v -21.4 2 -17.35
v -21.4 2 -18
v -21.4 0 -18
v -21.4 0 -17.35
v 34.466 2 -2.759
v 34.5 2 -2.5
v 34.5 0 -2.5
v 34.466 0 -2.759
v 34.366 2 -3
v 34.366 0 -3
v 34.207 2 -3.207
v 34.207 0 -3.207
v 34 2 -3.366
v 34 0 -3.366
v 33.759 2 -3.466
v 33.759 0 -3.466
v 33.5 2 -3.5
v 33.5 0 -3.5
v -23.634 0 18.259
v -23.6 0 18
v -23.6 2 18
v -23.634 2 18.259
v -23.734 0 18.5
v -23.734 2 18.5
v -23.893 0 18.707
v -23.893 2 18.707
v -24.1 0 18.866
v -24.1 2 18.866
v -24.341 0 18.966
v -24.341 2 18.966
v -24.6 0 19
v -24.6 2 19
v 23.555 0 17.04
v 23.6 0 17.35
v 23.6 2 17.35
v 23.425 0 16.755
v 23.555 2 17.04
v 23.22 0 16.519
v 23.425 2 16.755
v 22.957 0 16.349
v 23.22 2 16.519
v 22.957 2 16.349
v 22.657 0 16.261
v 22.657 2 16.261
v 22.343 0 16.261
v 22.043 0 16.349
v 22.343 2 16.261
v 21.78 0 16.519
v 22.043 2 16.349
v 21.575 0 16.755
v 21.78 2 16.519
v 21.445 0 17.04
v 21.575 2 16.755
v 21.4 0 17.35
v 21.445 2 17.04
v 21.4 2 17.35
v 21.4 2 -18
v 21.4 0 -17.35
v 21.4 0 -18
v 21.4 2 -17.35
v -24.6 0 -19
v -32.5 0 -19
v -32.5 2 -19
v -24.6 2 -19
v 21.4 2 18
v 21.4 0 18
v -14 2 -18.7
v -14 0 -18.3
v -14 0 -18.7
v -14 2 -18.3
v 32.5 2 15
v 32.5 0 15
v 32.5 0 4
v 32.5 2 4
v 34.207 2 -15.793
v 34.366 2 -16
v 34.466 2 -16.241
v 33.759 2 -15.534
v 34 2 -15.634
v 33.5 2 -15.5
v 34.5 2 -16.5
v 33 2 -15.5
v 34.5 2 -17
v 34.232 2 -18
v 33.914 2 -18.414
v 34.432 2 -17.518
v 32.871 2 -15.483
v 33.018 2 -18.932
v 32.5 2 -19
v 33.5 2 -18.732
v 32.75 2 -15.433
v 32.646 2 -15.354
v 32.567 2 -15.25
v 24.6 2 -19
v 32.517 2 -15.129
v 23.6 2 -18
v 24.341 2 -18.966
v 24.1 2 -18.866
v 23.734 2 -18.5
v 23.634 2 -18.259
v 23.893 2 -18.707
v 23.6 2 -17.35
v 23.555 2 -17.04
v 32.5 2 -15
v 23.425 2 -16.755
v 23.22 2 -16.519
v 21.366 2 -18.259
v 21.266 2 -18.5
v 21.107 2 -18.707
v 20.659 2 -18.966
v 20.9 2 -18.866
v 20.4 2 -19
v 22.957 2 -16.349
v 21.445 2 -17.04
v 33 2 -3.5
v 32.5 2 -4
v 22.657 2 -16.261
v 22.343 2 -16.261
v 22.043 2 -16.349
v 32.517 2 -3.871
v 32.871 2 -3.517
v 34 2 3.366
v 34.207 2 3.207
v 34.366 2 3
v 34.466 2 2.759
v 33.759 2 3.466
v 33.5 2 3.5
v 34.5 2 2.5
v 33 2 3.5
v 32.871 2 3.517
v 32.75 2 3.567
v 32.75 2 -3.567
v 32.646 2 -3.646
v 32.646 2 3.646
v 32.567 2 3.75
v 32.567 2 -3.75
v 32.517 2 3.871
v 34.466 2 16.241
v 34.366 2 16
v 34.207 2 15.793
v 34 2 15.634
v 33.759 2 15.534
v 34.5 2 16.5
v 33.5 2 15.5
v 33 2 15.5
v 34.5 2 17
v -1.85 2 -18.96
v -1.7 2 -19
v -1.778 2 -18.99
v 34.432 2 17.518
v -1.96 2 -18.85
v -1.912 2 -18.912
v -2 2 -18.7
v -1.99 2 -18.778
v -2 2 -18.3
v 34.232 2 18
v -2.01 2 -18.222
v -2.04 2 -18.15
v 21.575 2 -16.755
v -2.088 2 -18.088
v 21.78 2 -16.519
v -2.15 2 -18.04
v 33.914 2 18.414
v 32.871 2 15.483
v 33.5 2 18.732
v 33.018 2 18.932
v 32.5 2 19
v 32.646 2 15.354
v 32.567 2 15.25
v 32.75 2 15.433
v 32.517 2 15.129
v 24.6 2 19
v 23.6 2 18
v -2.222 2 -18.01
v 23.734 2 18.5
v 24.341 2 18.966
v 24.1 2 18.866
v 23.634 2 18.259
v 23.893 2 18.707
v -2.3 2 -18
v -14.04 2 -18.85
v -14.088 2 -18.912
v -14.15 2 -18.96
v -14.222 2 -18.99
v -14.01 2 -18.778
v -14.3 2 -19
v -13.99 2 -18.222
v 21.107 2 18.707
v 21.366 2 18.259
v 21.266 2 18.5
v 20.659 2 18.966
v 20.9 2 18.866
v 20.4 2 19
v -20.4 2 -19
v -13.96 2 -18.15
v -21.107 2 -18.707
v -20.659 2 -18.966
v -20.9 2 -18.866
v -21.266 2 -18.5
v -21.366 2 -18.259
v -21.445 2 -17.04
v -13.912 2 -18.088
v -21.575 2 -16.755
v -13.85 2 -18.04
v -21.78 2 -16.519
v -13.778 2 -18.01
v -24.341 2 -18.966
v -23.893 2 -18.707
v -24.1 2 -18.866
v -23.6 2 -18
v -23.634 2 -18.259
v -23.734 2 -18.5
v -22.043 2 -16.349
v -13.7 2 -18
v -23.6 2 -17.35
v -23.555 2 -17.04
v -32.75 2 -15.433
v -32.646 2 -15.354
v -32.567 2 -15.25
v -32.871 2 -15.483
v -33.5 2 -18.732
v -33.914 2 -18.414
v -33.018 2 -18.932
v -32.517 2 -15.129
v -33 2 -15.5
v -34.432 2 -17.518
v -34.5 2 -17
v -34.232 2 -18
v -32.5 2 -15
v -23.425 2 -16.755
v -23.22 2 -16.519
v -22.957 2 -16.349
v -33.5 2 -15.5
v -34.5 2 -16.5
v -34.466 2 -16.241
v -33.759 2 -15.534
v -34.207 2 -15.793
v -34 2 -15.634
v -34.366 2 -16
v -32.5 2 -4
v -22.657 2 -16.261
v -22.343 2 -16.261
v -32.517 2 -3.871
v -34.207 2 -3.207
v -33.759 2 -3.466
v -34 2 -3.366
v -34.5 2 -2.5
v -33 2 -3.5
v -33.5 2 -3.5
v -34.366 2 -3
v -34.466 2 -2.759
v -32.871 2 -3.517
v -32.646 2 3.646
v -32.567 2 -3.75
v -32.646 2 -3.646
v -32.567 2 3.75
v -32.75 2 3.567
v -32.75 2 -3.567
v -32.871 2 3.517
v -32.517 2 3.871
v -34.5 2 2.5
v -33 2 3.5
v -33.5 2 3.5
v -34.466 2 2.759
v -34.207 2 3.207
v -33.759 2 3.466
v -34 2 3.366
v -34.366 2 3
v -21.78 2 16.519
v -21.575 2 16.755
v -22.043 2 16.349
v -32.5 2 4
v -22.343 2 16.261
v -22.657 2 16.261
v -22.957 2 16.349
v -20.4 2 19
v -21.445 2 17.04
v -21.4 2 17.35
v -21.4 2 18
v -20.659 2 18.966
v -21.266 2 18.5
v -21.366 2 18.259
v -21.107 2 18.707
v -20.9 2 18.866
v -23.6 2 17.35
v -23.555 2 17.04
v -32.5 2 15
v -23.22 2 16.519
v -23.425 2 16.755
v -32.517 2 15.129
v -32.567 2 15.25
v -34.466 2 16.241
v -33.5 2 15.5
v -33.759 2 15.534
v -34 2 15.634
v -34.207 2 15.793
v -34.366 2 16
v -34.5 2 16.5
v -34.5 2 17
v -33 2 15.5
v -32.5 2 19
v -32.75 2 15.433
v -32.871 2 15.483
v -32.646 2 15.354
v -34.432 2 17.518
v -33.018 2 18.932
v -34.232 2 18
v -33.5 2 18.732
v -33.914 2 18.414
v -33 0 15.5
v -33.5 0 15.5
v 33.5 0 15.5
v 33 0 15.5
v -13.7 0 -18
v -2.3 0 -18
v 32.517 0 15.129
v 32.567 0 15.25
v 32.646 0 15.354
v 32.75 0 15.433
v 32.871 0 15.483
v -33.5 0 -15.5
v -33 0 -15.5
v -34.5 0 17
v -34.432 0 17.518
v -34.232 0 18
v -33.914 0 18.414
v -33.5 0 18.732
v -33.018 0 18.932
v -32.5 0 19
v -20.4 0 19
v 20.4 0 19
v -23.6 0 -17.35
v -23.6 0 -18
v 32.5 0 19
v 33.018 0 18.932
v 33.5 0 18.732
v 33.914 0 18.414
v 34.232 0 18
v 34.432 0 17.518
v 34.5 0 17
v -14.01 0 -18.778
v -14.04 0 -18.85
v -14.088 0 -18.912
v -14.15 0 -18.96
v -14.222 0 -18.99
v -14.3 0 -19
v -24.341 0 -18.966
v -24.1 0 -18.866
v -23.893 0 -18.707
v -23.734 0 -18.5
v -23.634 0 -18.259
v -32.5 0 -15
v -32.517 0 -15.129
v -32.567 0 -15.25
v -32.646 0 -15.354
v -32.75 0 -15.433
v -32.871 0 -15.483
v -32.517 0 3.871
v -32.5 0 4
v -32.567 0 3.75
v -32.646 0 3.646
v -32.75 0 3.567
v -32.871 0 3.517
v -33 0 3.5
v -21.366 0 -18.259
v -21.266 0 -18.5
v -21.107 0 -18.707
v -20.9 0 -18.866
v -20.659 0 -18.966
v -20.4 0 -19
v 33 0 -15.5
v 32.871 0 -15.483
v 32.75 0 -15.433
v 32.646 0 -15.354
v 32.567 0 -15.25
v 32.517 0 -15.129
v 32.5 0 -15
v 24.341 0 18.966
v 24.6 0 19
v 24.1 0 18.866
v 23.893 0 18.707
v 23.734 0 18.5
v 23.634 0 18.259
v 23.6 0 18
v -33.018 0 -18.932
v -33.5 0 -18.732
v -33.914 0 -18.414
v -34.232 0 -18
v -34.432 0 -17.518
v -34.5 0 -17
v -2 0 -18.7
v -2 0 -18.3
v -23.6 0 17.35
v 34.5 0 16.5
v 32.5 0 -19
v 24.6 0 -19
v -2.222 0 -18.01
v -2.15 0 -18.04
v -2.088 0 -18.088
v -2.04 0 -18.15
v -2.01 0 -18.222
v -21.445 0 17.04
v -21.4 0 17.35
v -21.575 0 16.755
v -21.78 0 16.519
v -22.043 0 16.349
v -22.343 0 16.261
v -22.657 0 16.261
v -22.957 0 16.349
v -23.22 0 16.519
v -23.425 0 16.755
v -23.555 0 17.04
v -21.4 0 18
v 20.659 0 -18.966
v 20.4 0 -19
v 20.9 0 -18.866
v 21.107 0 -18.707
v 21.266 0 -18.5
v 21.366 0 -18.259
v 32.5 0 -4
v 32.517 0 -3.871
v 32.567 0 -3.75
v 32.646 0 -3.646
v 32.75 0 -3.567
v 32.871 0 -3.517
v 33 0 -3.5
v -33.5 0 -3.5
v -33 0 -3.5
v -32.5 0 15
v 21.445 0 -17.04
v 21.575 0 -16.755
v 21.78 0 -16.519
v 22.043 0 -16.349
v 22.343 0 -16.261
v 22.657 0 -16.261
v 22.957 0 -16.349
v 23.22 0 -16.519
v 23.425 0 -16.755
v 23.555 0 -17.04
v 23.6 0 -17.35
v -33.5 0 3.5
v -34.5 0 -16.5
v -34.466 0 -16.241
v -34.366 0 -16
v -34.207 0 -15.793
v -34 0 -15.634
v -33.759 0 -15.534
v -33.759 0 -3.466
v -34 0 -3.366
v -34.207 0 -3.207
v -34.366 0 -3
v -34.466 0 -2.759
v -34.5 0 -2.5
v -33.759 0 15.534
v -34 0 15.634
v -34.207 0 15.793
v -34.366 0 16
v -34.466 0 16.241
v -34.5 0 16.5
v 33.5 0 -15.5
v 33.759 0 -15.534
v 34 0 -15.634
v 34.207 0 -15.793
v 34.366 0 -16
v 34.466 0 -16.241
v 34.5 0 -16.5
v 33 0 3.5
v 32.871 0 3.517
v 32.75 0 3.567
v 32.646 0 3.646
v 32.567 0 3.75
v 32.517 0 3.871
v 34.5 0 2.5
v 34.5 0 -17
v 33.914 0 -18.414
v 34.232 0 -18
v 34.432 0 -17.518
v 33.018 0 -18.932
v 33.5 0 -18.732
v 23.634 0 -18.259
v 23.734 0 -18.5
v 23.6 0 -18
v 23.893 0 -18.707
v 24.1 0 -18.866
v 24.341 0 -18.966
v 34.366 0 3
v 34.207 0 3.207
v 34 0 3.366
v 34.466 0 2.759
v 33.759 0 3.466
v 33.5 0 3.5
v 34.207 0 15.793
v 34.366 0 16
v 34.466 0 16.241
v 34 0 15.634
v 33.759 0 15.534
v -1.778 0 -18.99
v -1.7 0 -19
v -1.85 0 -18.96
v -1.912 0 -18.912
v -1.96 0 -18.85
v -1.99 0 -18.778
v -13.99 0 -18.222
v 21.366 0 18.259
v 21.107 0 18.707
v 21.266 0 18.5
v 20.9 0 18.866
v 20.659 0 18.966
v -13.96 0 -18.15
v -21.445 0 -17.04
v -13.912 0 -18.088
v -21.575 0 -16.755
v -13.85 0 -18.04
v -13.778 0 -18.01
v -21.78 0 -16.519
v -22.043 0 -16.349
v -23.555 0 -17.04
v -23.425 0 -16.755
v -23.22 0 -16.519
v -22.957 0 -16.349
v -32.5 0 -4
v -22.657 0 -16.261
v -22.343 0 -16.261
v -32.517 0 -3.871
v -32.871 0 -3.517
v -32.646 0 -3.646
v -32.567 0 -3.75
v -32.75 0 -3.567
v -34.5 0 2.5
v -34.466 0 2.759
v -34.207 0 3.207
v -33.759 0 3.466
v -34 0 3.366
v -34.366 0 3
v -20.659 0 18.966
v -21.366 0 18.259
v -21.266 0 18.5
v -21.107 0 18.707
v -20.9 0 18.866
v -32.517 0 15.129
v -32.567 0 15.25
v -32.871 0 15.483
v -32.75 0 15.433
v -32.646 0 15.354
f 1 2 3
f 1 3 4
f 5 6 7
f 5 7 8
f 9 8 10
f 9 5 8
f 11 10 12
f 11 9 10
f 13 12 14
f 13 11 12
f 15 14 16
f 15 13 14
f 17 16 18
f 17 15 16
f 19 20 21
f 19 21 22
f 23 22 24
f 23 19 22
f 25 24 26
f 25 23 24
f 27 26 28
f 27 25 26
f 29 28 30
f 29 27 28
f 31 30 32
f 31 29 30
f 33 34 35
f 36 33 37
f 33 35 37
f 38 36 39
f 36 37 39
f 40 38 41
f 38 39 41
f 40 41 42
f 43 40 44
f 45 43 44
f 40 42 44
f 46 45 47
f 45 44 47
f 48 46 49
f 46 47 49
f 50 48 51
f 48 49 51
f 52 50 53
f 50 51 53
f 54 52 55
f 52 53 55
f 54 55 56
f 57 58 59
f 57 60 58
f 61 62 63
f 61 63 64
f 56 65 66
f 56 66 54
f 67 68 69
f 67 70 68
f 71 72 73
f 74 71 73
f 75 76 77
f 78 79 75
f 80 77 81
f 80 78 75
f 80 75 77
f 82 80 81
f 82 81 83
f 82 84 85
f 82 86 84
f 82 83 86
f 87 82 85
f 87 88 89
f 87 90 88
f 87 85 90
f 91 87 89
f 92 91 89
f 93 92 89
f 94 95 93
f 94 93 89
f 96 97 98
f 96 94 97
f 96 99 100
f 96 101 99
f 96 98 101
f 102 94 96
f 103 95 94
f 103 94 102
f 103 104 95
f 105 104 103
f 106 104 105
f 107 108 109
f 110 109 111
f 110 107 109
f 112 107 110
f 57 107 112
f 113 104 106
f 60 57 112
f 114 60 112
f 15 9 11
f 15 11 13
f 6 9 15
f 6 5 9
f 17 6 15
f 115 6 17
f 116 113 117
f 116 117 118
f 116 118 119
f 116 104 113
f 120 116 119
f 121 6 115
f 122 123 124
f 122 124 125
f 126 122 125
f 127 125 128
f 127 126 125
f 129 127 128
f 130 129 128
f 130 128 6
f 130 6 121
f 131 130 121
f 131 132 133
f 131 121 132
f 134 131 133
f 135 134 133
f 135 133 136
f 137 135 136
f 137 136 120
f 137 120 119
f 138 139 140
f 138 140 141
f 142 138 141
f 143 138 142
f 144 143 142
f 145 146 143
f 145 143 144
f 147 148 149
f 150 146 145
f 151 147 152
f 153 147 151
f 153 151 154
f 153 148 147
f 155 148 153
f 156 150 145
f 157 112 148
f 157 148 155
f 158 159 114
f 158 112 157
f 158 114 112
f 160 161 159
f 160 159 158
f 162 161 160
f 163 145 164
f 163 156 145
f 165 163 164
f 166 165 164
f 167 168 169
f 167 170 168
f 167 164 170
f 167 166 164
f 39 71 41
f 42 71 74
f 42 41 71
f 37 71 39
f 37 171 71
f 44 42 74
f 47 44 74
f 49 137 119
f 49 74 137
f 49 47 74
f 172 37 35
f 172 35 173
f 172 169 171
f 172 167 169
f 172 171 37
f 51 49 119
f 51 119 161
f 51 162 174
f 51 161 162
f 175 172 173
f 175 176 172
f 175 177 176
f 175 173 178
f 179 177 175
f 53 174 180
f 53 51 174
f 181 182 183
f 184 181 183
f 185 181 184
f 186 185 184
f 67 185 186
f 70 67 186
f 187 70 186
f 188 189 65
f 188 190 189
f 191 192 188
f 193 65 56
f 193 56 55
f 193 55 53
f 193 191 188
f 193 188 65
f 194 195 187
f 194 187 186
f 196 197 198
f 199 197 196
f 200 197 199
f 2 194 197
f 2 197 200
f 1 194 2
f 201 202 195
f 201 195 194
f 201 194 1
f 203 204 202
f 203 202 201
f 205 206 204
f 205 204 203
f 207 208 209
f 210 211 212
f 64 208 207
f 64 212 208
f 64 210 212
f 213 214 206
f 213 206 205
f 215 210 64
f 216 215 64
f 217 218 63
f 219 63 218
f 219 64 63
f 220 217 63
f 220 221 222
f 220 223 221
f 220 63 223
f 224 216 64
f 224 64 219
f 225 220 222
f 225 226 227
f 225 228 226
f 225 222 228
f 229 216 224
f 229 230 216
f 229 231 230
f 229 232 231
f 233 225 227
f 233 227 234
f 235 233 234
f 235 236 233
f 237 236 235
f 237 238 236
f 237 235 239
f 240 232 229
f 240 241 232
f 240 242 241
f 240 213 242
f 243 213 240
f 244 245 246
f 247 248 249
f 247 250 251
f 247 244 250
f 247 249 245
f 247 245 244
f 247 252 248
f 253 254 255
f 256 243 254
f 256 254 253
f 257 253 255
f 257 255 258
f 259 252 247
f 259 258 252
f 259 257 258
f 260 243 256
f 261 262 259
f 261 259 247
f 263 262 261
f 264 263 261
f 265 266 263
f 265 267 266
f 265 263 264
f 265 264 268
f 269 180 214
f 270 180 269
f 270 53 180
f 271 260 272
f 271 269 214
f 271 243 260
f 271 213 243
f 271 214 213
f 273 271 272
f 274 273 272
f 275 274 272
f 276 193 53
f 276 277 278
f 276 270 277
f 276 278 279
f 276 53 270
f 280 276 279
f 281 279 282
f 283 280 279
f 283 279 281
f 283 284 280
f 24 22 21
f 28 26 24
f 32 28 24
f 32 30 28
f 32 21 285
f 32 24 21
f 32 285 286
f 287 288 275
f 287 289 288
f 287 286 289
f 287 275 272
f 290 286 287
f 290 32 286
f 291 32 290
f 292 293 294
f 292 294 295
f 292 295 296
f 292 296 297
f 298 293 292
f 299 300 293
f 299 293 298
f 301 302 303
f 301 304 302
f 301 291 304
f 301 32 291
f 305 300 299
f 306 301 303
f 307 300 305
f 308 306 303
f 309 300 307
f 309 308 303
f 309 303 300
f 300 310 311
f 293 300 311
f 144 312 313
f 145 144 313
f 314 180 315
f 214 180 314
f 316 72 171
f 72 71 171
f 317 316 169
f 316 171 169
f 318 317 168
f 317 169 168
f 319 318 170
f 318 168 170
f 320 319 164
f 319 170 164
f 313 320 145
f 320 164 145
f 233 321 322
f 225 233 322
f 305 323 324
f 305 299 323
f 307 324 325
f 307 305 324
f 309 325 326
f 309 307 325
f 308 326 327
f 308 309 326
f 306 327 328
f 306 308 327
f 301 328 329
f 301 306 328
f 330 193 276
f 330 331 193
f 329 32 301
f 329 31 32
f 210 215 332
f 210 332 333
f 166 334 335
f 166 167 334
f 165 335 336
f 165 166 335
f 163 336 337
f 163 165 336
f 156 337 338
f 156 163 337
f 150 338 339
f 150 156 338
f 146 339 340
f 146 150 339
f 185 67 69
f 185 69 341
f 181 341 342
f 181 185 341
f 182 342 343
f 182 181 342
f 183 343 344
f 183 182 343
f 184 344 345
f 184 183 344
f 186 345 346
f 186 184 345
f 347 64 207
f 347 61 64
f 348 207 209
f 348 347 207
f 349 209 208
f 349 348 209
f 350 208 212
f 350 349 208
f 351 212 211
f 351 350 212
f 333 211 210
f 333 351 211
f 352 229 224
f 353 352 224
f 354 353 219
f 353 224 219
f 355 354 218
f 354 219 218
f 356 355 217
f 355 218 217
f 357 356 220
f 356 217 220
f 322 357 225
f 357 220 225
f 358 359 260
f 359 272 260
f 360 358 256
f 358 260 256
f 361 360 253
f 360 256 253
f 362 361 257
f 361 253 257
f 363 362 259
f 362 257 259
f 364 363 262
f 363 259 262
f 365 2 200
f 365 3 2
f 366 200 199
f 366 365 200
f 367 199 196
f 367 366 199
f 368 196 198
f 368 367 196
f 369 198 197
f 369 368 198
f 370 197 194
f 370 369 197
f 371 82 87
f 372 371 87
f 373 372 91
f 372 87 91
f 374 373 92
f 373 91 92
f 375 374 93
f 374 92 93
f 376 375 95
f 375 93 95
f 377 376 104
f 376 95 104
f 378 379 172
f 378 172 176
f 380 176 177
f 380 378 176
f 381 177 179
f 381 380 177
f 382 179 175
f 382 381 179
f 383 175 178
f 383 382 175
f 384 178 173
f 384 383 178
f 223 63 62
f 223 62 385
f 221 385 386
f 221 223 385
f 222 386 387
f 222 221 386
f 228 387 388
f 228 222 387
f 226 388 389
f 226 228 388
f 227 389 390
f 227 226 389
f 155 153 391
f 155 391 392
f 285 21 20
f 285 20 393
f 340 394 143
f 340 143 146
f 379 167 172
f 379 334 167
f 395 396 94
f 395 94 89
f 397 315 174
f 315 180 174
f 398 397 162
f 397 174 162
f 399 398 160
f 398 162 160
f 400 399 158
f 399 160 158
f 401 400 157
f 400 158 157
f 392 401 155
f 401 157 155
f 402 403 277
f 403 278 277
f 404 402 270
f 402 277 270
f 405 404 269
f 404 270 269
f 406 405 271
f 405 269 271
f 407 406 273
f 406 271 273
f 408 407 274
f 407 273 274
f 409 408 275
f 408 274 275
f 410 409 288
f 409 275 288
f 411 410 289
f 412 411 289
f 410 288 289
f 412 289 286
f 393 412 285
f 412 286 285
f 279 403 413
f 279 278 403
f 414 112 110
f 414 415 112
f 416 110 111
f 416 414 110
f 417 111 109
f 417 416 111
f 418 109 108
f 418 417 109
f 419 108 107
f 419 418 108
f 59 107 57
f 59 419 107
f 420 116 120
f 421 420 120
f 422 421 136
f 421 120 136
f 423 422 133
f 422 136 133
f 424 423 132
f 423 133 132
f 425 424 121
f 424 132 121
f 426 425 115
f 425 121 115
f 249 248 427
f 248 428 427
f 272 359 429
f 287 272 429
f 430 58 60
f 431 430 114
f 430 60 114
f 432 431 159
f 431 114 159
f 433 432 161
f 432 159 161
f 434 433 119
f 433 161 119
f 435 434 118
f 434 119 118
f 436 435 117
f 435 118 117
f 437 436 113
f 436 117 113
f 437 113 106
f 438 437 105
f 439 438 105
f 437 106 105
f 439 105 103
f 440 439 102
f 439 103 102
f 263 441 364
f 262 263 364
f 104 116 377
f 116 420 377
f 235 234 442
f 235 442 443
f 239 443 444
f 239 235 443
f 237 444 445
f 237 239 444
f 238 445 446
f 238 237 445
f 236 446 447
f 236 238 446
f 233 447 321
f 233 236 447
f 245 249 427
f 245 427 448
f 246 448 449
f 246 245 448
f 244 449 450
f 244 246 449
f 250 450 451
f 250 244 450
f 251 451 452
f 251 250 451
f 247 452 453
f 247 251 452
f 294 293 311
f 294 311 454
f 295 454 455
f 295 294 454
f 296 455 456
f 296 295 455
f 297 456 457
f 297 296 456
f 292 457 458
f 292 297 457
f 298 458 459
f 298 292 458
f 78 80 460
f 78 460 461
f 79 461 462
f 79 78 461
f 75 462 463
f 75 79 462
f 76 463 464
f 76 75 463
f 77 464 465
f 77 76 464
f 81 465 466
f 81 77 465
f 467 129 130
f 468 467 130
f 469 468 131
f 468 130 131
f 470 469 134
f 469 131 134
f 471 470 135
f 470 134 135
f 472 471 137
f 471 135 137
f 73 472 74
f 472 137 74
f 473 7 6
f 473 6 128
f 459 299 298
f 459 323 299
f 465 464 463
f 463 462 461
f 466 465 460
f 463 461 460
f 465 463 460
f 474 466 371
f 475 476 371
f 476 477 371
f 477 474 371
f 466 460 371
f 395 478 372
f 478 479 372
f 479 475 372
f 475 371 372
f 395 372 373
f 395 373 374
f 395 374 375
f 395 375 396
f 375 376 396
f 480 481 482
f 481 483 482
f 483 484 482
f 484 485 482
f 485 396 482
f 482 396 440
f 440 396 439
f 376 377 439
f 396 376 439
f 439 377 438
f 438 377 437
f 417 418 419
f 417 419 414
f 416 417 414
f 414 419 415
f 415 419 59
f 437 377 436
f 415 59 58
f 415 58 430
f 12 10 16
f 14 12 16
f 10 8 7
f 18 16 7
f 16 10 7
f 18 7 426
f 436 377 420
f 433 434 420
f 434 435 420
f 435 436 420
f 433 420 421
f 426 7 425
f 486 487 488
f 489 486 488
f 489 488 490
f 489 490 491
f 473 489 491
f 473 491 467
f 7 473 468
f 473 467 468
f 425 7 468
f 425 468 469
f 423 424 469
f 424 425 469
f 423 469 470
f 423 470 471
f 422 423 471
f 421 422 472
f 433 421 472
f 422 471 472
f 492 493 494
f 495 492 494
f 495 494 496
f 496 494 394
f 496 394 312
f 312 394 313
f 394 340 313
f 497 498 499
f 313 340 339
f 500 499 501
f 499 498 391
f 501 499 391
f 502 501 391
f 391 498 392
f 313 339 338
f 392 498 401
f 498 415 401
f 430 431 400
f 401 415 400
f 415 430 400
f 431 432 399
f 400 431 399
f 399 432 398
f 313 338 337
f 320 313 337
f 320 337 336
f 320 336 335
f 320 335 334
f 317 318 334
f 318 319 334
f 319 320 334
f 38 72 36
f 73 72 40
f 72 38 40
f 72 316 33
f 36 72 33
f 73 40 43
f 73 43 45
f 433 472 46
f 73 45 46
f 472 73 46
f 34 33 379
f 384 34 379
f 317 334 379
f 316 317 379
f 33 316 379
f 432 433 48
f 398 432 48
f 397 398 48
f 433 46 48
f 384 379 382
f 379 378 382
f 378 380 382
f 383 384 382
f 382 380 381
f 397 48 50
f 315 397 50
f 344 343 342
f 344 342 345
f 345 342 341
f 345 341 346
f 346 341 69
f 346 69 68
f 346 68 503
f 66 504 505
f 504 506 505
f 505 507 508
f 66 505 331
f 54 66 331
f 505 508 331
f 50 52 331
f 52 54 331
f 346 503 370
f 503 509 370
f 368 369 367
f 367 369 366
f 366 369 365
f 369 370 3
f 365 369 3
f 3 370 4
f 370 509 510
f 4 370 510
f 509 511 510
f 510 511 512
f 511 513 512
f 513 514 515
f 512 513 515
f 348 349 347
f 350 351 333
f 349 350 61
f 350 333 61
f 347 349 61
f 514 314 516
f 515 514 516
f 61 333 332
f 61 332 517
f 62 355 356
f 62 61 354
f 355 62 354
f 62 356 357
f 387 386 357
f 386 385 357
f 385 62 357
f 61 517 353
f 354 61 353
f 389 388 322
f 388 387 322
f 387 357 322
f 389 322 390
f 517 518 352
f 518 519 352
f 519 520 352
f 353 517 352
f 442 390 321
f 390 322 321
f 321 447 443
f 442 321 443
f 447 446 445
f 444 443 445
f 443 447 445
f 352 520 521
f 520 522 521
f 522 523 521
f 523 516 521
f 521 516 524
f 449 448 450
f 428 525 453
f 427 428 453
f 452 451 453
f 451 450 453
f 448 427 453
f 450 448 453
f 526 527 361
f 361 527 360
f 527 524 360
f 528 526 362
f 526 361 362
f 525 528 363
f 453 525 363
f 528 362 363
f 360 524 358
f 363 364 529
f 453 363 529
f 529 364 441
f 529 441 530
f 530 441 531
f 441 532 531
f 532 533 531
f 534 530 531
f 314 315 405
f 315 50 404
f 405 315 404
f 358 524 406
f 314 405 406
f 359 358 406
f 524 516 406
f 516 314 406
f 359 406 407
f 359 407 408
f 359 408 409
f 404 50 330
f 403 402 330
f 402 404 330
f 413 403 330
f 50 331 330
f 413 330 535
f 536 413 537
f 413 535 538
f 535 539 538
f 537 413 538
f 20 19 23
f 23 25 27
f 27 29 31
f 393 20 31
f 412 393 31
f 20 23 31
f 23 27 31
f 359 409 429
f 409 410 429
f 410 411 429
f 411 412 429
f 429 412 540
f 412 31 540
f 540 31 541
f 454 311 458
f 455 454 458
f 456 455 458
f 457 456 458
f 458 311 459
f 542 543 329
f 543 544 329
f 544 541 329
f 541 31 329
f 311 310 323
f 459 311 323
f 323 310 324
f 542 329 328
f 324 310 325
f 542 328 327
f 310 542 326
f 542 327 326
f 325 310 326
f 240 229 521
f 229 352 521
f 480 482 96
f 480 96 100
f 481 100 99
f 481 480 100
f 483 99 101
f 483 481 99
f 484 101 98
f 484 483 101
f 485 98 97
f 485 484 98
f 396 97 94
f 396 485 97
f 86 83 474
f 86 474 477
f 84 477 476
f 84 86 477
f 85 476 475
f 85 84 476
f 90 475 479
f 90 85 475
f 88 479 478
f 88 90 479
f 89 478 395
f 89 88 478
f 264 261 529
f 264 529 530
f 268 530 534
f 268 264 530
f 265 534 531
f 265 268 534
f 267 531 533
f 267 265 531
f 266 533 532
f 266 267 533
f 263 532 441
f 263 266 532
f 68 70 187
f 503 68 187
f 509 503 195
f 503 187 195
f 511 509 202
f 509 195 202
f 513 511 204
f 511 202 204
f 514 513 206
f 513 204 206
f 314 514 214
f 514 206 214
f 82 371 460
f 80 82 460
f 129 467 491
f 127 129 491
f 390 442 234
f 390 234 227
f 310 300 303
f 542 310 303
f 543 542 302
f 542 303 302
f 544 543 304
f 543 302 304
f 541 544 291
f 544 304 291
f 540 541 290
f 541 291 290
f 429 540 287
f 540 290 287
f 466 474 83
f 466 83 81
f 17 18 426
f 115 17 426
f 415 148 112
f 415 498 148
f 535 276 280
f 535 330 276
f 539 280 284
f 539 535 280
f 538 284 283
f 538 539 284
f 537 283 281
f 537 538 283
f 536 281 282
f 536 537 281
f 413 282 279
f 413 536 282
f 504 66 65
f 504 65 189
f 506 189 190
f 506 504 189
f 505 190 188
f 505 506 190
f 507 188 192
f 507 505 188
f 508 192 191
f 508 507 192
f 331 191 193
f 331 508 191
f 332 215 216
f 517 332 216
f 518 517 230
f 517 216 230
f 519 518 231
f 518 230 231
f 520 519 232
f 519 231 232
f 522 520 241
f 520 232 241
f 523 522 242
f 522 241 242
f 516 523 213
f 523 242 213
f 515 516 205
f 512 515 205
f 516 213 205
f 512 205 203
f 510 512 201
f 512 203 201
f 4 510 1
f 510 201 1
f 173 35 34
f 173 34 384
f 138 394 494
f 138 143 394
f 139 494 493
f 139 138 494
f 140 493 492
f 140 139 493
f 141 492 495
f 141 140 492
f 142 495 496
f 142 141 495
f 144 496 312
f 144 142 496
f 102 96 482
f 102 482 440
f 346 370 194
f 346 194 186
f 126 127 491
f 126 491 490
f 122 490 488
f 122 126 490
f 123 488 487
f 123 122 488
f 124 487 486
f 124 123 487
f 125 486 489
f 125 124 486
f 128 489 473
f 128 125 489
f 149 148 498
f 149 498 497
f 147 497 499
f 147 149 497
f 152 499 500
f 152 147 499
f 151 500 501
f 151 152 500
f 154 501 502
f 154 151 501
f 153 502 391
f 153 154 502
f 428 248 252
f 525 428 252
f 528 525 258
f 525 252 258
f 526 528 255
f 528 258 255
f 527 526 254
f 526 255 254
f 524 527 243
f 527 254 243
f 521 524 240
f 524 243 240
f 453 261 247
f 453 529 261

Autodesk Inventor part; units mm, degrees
ref_plane "YZ Plane" through (0, 0, 0) normal (1, 0, 0) x (0, 1, 0)
ref_plane "XZ Plane" through (0, 0, 0) normal (0, 1, 0) x (-1, 0, 0)
ref_plane "XY Plane" through (0, 0, 0) normal (0, 0, 1) x (1, 0, 0)
sketch "Эскиз1" plane through (0, 0, 0) normal (0, 1, 0) x (-1, 0, 0)
  line L0 (-34.5, 19) -> (34.5, 19)
  line L1 (34.5, 19) -> (34.5, -19)
  line L2 (34.5, -19) -> (-34.5, -19)
  line L3 (-34.5, -19) -> (-34.5, 19)
  line L4 (-34.5, 19) -> (34.5, -19) construction
  line L5 (34.5, 19) -> (-34.5, -19) construction
  line L6 (34.5, -9.5) -> (34.5, 9.5)
  line L7 (36.5, -15.5) -> (32.5, -15.5)
  line L8 (32.5, -15.5) -> (32.5, -3.5)
  line L9 (32.5, -3.5) -> (36.5, -3.5)
  line L10 (36.5, -3.5) -> (36.5, -15.5)
  line L11 (36.5, -15.5) -> (32.5, -3.5) construction
  line L12 (32.5, -15.5) -> (36.5, -3.5) construction
  line L13 (36.5, 3.5) -> (32.5, 3.5)
  line L14 (32.5, 3.5) -> (32.5, 15.5)
  line L15 (32.5, 15.5) -> (36.5, 15.5)
  line L16 (36.5, 15.5) -> (36.5, 3.5)
  line L17 (36.5, 3.5) -> (32.5, 15.5) construction
  line L18 (32.5, 3.5) -> (36.5, 15.5) construction
  line L19 (-34.5, -9.5) -> (-34.5, 9.5)
  line L20 (-32.5, -15.5) -> (-36.5, -15.5)
  line L21 (-36.5, -15.5) -> (-36.5, -3.5)
  line L22 (-36.5, -3.5) -> (-32.5, -3.5)
  line L23 (-32.5, -3.5) -> (-32.5, -15.5)
  line L24 (-32.5, -15.5) -> (-36.5, -3.5) construction
  line L25 (-36.5, -15.5) -> (-32.5, -3.5) construction
  line L26 (-32.5, 3.5) -> (-36.5, 3.5)
  line L27 (-36.5, 3.5) -> (-36.5, 15.5)
  line L28 (-36.5, 15.5) -> (-32.5, 15.5)
  line L29 (-32.5, 15.5) -> (-32.5, 3.5)
  line L30 (-32.5, 3.5) -> (-36.5, 15.5) construction
  line L31 (-36.5, 3.5) -> (-32.5, 15.5) construction
  point P0 (0, 0)
  point P1 (34.5, 0)
  point P2 (-34.5, 0)
  point P3 (-34.5, 15.5)
  point P4 (-34.5, 3.5)
  point P5 (-34.5, -3.5)
  point P6 (-34.5, -15.5)
  point P7 (34.5, -15.5)
  point P8 (34.5, -3.5)
  point P9 (34.5, 3.5)
  point P10 (34.5, 15.5)
  dimension "d0" = 69
  dimension "d1" = 38
  dimension "d4" = 19
  dimension "d5" = 4
  dimension "d6" = 12
  dimension "d7" = 4
  dimension "d8" = 12
  dimension "d9" = 19
  dimension "d10" = 4
  dimension "d11" = 12
  dimension "d12" = 4
  dimension "d13" = 12
extrude "Выдавливание1" add sketch "Эскиз1" along normal blind 2 contours L0 L1 L15 L14 L13 L9 L8 L7 L2 L3 L20 L23 L22 L26 L29 L28
fillet "Сопряжение1" radius 0.5 8 edges at (-32.5, 1, -3.5) (-32.5, 1, -15.5) (-32.5, 1, 3.5) (-32.5, 1, 15.5) (32.5, 1, -15.5) (32.5, 1, -3.5) (32.5, 1, 3.5) (32.5, 1, 15.5)
fillet "Сопряжение2" radius 1 8 edges at (34.5, 1, -3.5) (34.5, 1, 3.5) (34.5, 1, -15.5) (34.5, 1, 15.5) (-34.5, 1, -15.5) (-34.5, 1, -3.5) (-34.5, 1, 3.5) (-34.5, 1, 15.5)
fillet "Сопряжение3" radius 2 4 edges at (-34.5, 1, -19) (-34.5, 1, 19) (34.5, 1, -19) (34.5, 1, 19)
sketch "Эскиз2" plane through (0, 2, 0) normal (0, 1, 0) x (1, 0, 0)
  line L0 (-34.5, -19) -> (34.5, -19)
  line L1 (34.5, -19) -> (34.5, 19)
  line L2 (34.5, 19) -> (-34.5, 19)
  line L3 (-34.5, 19) -> (-34.5, -19)
  line L4 (-34.5, -19) -> (34.5, 19) construction
  line L5 (34.5, -19) -> (-34.5, 19) construction
  line L6 (34.5, -2.5) -> (34.5, 2.5) projected
  line L7 (34.5, 0) -> (19.5, 0)
  line L8 (19.5, 5) -> (19.5, -5)
  line L9 (34.5, -19) -> (4.5, -19)
  line L10 (-32.5, -19) -> (32.5, -19) projected
  line L11 (4.5, -19) -> (4.5, -14)
  point P0 (0, 0)
  dimension "d17" = 69
  dimension "d18" = 38
  dimension "d19" = 15
  dimension "d20" = 10
  dimension "d21" = 30
  dimension "d22" = 5
sketch "Эскиз3" plane through (0, 2, 0) normal (0, 1, 0) x (1, 0, 0)
  arc A0 (32.5, -19) -> (34.5, -17) centre (32.5, -17) ccw projected
  line L0 (34.5, -17) -> (34.5, -16.5) projected
  arc A1 (34.5, -16.5) -> (33.5, -15.5) centre (33.5, -16.5) ccw projected
  line L1 (33.5, -15.5) -> (33, -15.5) projected
  arc A2 (32.5, -15) -> (33, -15.5) centre (33, -15) ccw projected
  line L2 (32.5, -15) -> (32.5, -4) projected
  arc A3 (33, -3.5) -> (32.5, -4) centre (33, -4) ccw projected
  line L3 (33, -3.5) -> (33.5, -3.5) projected
  arc A4 (33.5, -3.5) -> (34.5, -2.5) centre (33.5, -2.5) ccw projected
  line L4 (34.5, -2.5) -> (34.5, 2.5) projected
  arc A5 (34.5, 2.5) -> (33.5, 3.5) centre (33.5, 2.5) ccw projected
  line L5 (33.5, 3.5) -> (33, 3.5) projected
  arc A6 (32.5, 4) -> (33, 3.5) centre (33, 4) ccw projected
  line L6 (32.5, 4) -> (32.5, 15) projected
  arc A7 (33, 15.5) -> (32.5, 15) centre (33, 15) ccw projected
  line L7 (33, 15.5) -> (33.5, 15.5) projected
  arc A8 (33.5, 15.5) -> (34.5, 16.5) centre (33.5, 16.5) ccw projected
  line L8 (34.5, 16.5) -> (34.5, 17) projected
  arc A9 (34.5, 17) -> (32.5, 19) centre (32.5, 17) ccw projected
  line L9 (32.5, 19) -> (-32.5, 19) projected
  arc A10 (-32.5, 19) -> (-34.5, 17) centre (-32.5, 17) ccw projected
  line L10 (-34.5, 17) -> (-34.5, 16.5) projected
  arc A11 (-34.5, 16.5) -> (-33.5, 15.5) centre (-33.5, 16.5) ccw projected
  line L11 (-33.5, 15.5) -> (-33, 15.5) projected
  arc A12 (-32.5, 15) -> (-33, 15.5) centre (-33, 15) ccw projected
  line L12 (-32.5, 15) -> (-32.5, 4) projected
  arc A13 (-33, 3.5) -> (-32.5, 4) centre (-33, 4) ccw projected
  line L13 (-33, 3.5) -> (-33.5, 3.5) projected
  arc A14 (-33.5, 3.5) -> (-34.5, 2.5) centre (-33.5, 2.5) ccw projected
  line L14 (-34.5, 2.5) -> (-34.5, -2.5) projected
  arc A15 (-34.5, -2.5) -> (-33.5, -3.5) centre (-33.5, -2.5) ccw projected
  line L15 (-33.5, -3.5) -> (-33, -3.5) projected
  arc A16 (-32.5, -4) -> (-33, -3.5) centre (-33, -4) ccw projected
  line L16 (-32.5, -4) -> (-32.5, -15) projected
  arc A17 (-33, -15.5) -> (-32.5, -15) centre (-33, -15) ccw projected
  line L17 (-33, -15.5) -> (-33.5, -15.5) projected
  arc A18 (-33.5, -15.5) -> (-34.5, -16.5) centre (-33.5, -16.5) ccw projected
  line L18 (-34.5, -16.5) -> (-34.5, -17) projected
  arc A19 (-34.5, -17) -> (-32.5, -19) centre (-32.5, -17) ccw projected
  line L19 (-32.5, -19) -> (32.5, -19) projected
  circle A20 centre (-22.5, 17.35) radius 1.5 projected
  circle A21 centre (-22.5, -17.35) radius 1.5 projected
  circle A22 centre (-22.5, -17.35) radius 1.1
  circle A23 centre (-22.5, 17.35) radius 1.1
  line L20 (32.5, 19) -> (-32.5, 19) projected
  line L21 (-32.5, -19) -> (32.5, -19) projected
  line L22 (-23.6, 19) -> (-21.4, 19)
  line L23 (-21.4, 19) -> (-21.4, -19)
  line L24 (-21.4, -19) -> (-23.6, -19)
  line L25 (-23.6, -19) -> (-23.6, 19)
  point P0 (0, 0)
  point P1 (-23.6, 16.3302)
  point P2 (-21.4, 16.3302)
  point P3 (-21.4, -19)
  point P4 (-21.4, -16.3302)
  point P5 (-23.6, -16.3302)
  point P6 (-23.6, -17.35)
  point P7 (-21.4, -17.35)
  point P8 (-23.6, 17.35)
  point P9 (-21.4, 17.35)
  dimension "d23" = 2.2
  dimension "d24" = 2.2
extrude "Выдавливание2" cut sketch "Эскиз3" against normal blind 10 contours L19 L25 A21 L23 | A21 L25 A22 L23 | A22 | L25 L9 L23 A20 | A20 L23 A23 L25 | A23 picked at (-22.5442, -18.7071) picked at (-22.5442, 18.7071)
fillet "Сопряжение4" radius 1 4 edges at (-23.6, 1, 19) (-21.4, 1, 19) (-23.6, 1, -19) (-21.4, 1, -19)
mirror "Зеркальное отражение1" about plane through (0, 0, 0) normal (1, 0, 0) of "Выдавливание2", "Сопряжение4"
sketch "Эскиз4" plane through (0, 2, 0) normal (0, 1, 0) x (1, 0, 0)
  arc A0 (-14, 18.7) -> (-14.3, 19) centre (-14.3, 18.7) ccw projected
  line L0 (-14.3, 19) -> (-26, 19) projected
  arc A1 (-26, 19) -> (-28, 17) centre (-26, 17) ccw projected
  line L1 (-28, 17) -> (-28, -17) projected
  arc A2 (-28, -17) -> (-26, -19) centre (-26, -17) ccw projected
  line L2 (-26, -19) -> (8, -19) projected
  arc A3 (8, -19) -> (10, -17) centre (8, -17) ccw projected
  line L3 (10, -17) -> (10, 17) projected
  arc A4 (10, 17) -> (8, 19) centre (8, 17) ccw projected
  line L4 (8, 19) -> (-1.7, 19) projected
  arc A5 (-1.7, 19) -> (-2, 18.7) centre (-1.7, 18.7) ccw projected
  line L5 (-2, 18.7) -> (-2, 18.3) projected
  arc A6 (-2.3, 18) -> (-2, 18.3) centre (-2.3, 18.3) ccw projected
  line L6 (-2.3, 18) -> (-13.7, 18) projected
  arc A7 (-14, 18.3) -> (-13.7, 18) centre (-13.7, 18.3) ccw projected
  line L7 (-14, 18.3) -> (-14, 18.7) projected
  arc A8 (21.4, 18) -> (20.4, 19) centre (20.4, 18) ccw projected
  line L8 (20.4, 19) -> (-20.4, 19) projected
  arc A9 (-20.4, 19) -> (-21.4, 18) centre (-20.4, 18) ccw projected
  line L9 (-21.4, 18) -> (-21.4, 17.35) projected
  arc A10 (-23.6, 17.35) -> (-21.4, 17.35) centre (-22.5, 17.35) ccw projected
  line L10 (-23.6, 17.35) -> (-23.6, 18) projected
  arc A11 (-23.6, 18) -> (-24.6, 19) centre (-24.6, 18) ccw projected
  line L11 (-24.6, 19) -> (-32.5, 19) projected
  arc A12 (-32.5, 19) -> (-34.5, 17) centre (-32.5, 17) ccw projected
  line L12 (-34.5, 17) -> (-34.5, 16.5) projected
  arc A13 (-34.5, 16.5) -> (-33.5, 15.5) centre (-33.5, 16.5) ccw projected
  line L13 (-33.5, 15.5) -> (-33, 15.5) projected
  arc A14 (-32.5, 15) -> (-33, 15.5) centre (-33, 15) ccw projected
  line L14 (-32.5, 15) -> (-32.5, 4) projected
  arc A15 (-33, 3.5) -> (-32.5, 4) centre (-33, 4) ccw projected
  line L15 (-33, 3.5) -> (-33.5, 3.5) projected
  arc A16 (-33.5, 3.5) -> (-34.5, 2.5) centre (-33.5, 2.5) ccw projected
  line L16 (-34.5, 2.5) -> (-34.5, -2.5) projected
  arc A17 (-34.5, -2.5) -> (-33.5, -3.5) centre (-33.5, -2.5) ccw projected
  line L17 (-33.5, -3.5) -> (-33, -3.5) projected
  arc A18 (-32.5, -4) -> (-33, -3.5) centre (-33, -4) ccw projected
  line L18 (-32.5, -4) -> (-32.5, -15) projected
  arc A19 (-33, -15.5) -> (-32.5, -15) centre (-33, -15) ccw projected
  line L19 (-33, -15.5) -> (-33.5, -15.5) projected
  arc A20 (-33.5, -15.5) -> (-34.5, -16.5) centre (-33.5, -16.5) ccw projected
  line L20 (-34.5, -16.5) -> (-34.5, -17) projected
  arc A21 (-34.5, -17) -> (-32.5, -19) centre (-32.5, -17) ccw projected
  line L21 (-32.5, -19) -> (-24.6, -19) projected
  arc A22 (-24.6, -19) -> (-23.6, -18) centre (-24.6, -18) ccw projected
  line L22 (-23.6, -18) -> (-23.6, -17.35) projected
  arc A23 (-21.4, -17.35) -> (-23.6, -17.35) centre (-22.5, -17.35) ccw projected
  line L23 (-21.4, -17.35) -> (-21.4, -18) projected
  arc A24 (-21.4, -18) -> (-20.4, -19) centre (-20.4, -18) ccw projected
  line L24 (-20.4, -19) -> (20.4, -19) projected
  arc A25 (20.4, -19) -> (21.4, -18) centre (20.4, -18) ccw projected
  line L25 (21.4, -18) -> (21.4, -17.35) projected
  arc A26 (23.6, -17.35) -> (21.4, -17.35) centre (22.5, -17.35) ccw projected
  line L26 (23.6, -17.35) -> (23.6, -18) projected
  arc A27 (23.6, -18) -> (24.6, -19) centre (24.6, -18) ccw projected
  line L27 (24.6, -19) -> (32.5, -19) projected
  arc A28 (32.5, -19) -> (34.5, -17) centre (32.5, -17) ccw projected
  line L28 (34.5, -17) -> (34.5, -16.5) projected
  arc A29 (34.5, -16.5) -> (33.5, -15.5) centre (33.5, -16.5) ccw projected
  line L29 (33.5, -15.5) -> (33, -15.5) projected
  arc A30 (32.5, -15) -> (33, -15.5) centre (33, -15) ccw projected
  line L30 (32.5, -15) -> (32.5, -4) projected
  arc A31 (33, -3.5) -> (32.5, -4) centre (33, -4) ccw projected
  line L31 (33, -3.5) -> (33.5, -3.5) projected
  arc A32 (33.5, -3.5) -> (34.5, -2.5) centre (33.5, -2.5) ccw projected
  line L32 (34.5, -2.5) -> (34.5, 2.5) projected
  arc A33 (34.5, 2.5) -> (33.5, 3.5) centre (33.5, 2.5) ccw projected
  line L33 (33.5, 3.5) -> (33, 3.5) projected
  arc A34 (32.5, 4) -> (33, 3.5) centre (33, 4) ccw projected
  line L34 (32.5, 4) -> (32.5, 15) projected
  arc A35 (33, 15.5) -> (32.5, 15) centre (33, 15) ccw projected
  line L35 (33, 15.5) -> (33.5, 15.5) projected
  arc A36 (33.5, 15.5) -> (34.5, 16.5) centre (33.5, 16.5) ccw projected
  line L36 (34.5, 16.5) -> (34.5, 17) projected
  arc A37 (34.5, 17) -> (32.5, 19) centre (32.5, 17) ccw projected
  line L37 (32.5, 19) -> (24.6, 19) projected
  arc A38 (24.6, 19) -> (23.6, 18) centre (24.6, 18) ccw projected
  line L38 (23.6, 18) -> (23.6, 17.35) projected
  arc A39 (21.4, 17.35) -> (23.6, 17.35) centre (22.5, 17.35) ccw projected
  line L39 (21.4, 17.35) -> (21.4, 18) projected
  point P0 (0, 0)
extrude "Выдавливание3" cut sketch "Эскиз4" against normal blind 10 contours A0 L8 A5 L5 A6 L6 A7 L7
properties part number "BMS_board"
